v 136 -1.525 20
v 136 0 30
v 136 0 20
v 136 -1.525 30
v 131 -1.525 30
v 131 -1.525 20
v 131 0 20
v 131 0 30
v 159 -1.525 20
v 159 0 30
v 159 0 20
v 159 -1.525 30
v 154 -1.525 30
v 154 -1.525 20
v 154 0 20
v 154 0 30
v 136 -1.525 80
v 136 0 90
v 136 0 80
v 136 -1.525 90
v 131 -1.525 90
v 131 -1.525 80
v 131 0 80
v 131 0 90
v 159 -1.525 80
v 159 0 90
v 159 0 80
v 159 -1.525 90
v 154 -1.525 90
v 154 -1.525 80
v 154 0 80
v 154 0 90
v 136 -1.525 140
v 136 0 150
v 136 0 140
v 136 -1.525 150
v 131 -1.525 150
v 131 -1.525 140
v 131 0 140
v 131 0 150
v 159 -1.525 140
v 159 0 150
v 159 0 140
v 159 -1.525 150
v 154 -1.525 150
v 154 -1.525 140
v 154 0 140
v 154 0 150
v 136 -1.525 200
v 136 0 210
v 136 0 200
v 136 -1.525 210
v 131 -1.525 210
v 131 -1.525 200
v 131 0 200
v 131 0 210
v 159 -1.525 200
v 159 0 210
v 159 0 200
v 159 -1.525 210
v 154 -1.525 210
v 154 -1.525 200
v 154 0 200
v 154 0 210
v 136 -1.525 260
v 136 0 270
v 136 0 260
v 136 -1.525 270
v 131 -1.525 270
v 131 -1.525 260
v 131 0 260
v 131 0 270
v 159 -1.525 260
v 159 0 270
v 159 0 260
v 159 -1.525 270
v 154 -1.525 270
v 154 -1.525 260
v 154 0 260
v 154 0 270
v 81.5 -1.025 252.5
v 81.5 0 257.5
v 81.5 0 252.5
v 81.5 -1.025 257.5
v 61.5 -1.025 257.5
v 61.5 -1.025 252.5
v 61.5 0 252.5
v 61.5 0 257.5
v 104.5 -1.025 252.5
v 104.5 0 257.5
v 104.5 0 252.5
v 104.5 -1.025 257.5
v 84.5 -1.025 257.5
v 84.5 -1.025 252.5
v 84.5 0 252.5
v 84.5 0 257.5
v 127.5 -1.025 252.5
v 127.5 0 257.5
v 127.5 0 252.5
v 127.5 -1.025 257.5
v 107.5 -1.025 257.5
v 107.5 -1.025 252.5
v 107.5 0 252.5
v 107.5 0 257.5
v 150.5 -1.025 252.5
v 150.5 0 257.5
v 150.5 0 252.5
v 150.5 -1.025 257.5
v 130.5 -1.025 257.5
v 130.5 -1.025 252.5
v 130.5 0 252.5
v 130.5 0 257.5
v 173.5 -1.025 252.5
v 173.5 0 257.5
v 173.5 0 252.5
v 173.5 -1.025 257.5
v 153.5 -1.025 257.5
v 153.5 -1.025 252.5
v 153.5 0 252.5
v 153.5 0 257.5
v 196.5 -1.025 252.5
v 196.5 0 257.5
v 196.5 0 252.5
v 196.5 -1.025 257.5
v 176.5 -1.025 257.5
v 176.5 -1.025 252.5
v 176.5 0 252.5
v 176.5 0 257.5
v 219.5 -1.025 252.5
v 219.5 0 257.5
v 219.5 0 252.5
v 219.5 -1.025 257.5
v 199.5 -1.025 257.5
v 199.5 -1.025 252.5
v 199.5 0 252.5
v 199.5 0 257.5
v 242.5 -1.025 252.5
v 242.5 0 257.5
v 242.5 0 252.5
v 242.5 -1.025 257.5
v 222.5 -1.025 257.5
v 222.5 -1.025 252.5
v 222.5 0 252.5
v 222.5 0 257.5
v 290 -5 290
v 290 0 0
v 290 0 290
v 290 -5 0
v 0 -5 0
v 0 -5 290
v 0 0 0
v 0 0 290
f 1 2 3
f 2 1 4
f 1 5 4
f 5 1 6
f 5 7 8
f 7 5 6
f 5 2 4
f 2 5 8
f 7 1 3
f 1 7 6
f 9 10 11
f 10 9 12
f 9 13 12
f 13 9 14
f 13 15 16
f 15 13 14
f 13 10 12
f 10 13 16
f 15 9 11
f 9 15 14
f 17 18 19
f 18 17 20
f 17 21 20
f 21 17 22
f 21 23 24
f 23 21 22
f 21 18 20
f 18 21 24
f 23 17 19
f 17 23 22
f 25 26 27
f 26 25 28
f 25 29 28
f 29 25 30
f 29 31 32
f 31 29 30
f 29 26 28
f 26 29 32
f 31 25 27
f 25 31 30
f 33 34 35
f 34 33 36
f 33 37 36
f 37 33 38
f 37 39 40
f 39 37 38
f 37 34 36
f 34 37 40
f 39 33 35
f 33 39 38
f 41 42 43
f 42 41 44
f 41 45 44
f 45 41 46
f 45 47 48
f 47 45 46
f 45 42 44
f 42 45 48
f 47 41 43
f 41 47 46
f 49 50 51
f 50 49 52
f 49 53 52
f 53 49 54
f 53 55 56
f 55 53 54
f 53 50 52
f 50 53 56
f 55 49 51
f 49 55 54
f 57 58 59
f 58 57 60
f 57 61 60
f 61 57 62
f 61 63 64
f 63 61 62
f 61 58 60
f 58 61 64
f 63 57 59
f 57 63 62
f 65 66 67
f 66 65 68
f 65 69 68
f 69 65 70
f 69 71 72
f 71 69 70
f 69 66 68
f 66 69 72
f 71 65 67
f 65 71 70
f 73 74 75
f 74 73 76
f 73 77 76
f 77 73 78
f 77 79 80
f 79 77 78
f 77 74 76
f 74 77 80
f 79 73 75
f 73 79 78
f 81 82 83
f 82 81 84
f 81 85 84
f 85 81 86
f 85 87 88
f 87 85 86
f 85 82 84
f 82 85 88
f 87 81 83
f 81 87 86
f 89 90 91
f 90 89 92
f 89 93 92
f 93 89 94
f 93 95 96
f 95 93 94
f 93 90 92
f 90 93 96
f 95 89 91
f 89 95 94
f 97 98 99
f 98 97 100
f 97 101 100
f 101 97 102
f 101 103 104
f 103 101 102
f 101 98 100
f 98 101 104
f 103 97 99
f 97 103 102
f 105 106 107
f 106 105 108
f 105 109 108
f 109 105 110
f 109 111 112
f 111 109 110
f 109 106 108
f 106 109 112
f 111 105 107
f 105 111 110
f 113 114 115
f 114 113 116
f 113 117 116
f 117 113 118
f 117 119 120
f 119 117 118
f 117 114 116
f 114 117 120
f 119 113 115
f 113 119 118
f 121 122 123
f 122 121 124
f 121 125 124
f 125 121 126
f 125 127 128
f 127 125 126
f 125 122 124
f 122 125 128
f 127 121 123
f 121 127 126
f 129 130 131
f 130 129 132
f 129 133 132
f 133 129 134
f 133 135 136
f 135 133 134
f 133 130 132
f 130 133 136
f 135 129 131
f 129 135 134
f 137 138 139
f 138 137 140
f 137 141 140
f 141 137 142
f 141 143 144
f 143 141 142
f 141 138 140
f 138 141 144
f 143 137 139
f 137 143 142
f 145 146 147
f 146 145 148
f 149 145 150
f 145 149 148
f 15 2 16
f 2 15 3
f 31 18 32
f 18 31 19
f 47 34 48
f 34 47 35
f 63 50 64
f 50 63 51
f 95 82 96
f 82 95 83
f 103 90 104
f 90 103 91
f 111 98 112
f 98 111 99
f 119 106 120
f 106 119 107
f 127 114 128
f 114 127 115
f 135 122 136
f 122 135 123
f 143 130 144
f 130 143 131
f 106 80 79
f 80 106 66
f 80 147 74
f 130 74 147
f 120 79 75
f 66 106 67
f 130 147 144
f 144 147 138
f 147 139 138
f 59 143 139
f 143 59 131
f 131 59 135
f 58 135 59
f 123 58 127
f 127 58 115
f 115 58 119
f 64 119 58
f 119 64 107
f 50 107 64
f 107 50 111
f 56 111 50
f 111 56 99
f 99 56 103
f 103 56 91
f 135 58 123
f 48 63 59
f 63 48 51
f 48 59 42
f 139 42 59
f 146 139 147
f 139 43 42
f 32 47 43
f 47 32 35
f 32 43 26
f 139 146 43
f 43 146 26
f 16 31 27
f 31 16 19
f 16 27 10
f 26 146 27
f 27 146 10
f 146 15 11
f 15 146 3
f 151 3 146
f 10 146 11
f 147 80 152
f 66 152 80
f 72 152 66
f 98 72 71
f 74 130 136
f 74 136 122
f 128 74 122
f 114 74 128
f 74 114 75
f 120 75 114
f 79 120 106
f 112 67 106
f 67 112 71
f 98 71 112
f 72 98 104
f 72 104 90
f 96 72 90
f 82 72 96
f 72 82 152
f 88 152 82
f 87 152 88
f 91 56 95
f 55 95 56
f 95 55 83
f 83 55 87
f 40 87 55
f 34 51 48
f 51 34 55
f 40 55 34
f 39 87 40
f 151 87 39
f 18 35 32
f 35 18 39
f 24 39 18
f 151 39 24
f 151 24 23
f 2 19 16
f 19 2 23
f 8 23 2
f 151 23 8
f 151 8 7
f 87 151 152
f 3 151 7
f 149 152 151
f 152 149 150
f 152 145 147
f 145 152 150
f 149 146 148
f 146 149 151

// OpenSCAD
$fa=6;
$fs=0.05;
p = 0.05;
p2 = 2*p;

inplace = true;

lx = 290;
ly = 290;
lz = 290;
th = 5;

ramp_y = 145;

//top
cable_hole_d = 30;

anchor_x = 14;
anchor_y = 14;
anchor_d = 3;

cam_distance = 18;
cam_y = ly - (ly-ramp_y)/2;
cam_x1 = lx/2 - cam_distance/2;
cam_x2 = lx/2 + cam_distance/2;
cam_d = 2.1;

cam_cable_w = 18;
cam_cable_holder_w = 5;
cam_cable_holder_l = 10;
cam_cable_holder_h1 = 6;
cam_cable_holder_t = 3;
cam_cable_holder_depth = 1.5;
cam_cable_x1 = lx/2 - (cam_cable_w/2 + cam_cable_holder_w/2);
cam_cable_x2 = lx/2 + (cam_cable_w/2 + cam_cable_holder_w/2);
cam_cable_y_top_dy = 50;
cam_cable_y_top_y_start = 10 + cam_cable_holder_l/2;
cam_cable_y_top = [cam_cable_y_top_y_start,
                   cam_cable_y_top_y_start + 1 * cam_cable_y_top_dy,
                   cam_cable_y_top_y_start + 2 * cam_cable_y_top_dy,
                   cam_cable_y_top_y_start + 3 * cam_cable_y_top_dy]; 

//bottom
motor_mount_x = [25, 70];
motor_mount_y = [5, 60, 115];
motor_mount_d = 2.8;

//front
cam_cable_y_front_dy = 60;
cam_cable_y_front_y_start = 20 + cam_cable_holder_l/2;
cam_cable_y_front = [cam_cable_y_front_y_start,
                     cam_cable_y_front_y_start + 1 * cam_cable_y_front_dy,
                     cam_cable_y_front_y_start + 2 * cam_cable_y_front_dy,
                     cam_cable_y_front_y_start + 3 * cam_cable_y_front_dy,
                     cam_cable_y_front_y_start + 4 * cam_cable_y_front_dy]; 

magnet_l = 20;
magnet_w = 5;
magnet_h = 1;

magnet_y = lz - 30 - magnet_w;
magnet_x_spacing = 3;
magnet_count = 8;
magnet_x_start = (lx - magnet_count * (magnet_x_spacing + magnet_l) - magnet_x_spacing) / 2;

module hole(d, h=th+p2) {
    translate([0, 0, h/2-p])
    cylinder(h=h, d=d, center=true);
}

module engrave(a, b, c) {
    translate([0, 0, c/2])
    cube([a, b, c+p], center=true);    
}

module cable_holder_hole() {
    engrave(cam_cable_holder_w, cam_cable_holder_l, cam_cable_holder_depth);
}

module cable_holder() {
    union() {
        cube([cam_cable_holder_w, cam_cable_holder_l, cam_cable_holder_h1]);
        translate([cam_cable_w + cam_cable_holder_w, 0, 0])
        cube([cam_cable_holder_w, cam_cable_holder_l, cam_cable_holder_h1]);
        cube([cam_cable_w + 2 * cam_cable_holder_w, cam_cable_holder_l, cam_cable_holder_t]);
    }
}

module motor_mount_holes() {    
    for (i=motor_mount_x) {
        for(j=motor_mount_y) {
            translate([i, j, 0])
            hole(motor_mount_d);
        }
    }
}

module top_() {
    difference() {
        cube([lx, ly, th]);
        //cable_hole
        translate([lx/2, ly/2, 0])
        hole(cable_hole_d);
        //anchors
        translate([anchor_x, anchor_y, 0])
        hole(anchor_d);
        translate([lx - anchor_x, anchor_y, 0])
        hole(anchor_d);
        translate([anchor_x, ly - anchor_y, 0])
        hole(anchor_d);
        translate([lx - anchor_x, ly - anchor_y, 0])
        hole(anchor_d);
        //cam        
        translate([cam_x1, cam_y, 0])
        hole(cam_d);
        translate([cam_x2, cam_y, 0])
        hole(cam_d);
        //cam_cable
        for (i=cam_cable_y_top) {
            translate([cam_cable_x1, i, 0])
            cable_holder_hole();
            translate([cam_cable_x2, i, 0])
            cable_holder_hole();
        }
    }    
}

module bottom_() {
    difference() {
        cube([lx, ly, th]);
        //cable_hole
        translate([lx/2, ly/2, 0])
        hole(cable_hole_d);
        //motor mount
        motor_mount_holes();
        mirror([1, 0, 0])
        translate([-lx, 0, 0])
        motor_mount_holes();
    }    
}

module left_() {
    difference() {
        cube([lx, ly, th]);
        //cable_hole
        translate([lx/2, ly/2, 0])
        hole(cable_hole_d);
    }    
}

module right_() {
    difference() {
        cube([lx, ly, th]);
        //cable_hole
        translate([lx/2, ly/2, 0])
        hole(cable_hole_d);
    }    
}

module front_() {
    difference() {
        cube([lx, ly, th]);
        //cam_cable
        for (i=cam_cable_y_front) {
            translate([cam_cable_x1, i, 0])
            cable_holder_hole();
            translate([cam_cable_x2, i, 0])
            cable_holder_hole();
        }
        //magnets
        for(i=[0:magnet_count-1]) {
            translate([magnet_x_start + magnet_l + i * (magnet_l + magnet_x_spacing), magnet_y, 0])
            engrave(magnet_l, magnet_w, magnet_h);
        }
    }    
}

module back_() {
    difference() {
        cube([lx, ly, th]);
        //cable_hole
        translate([lx/2, ly/2, 0])
        hole(cable_hole_d);
    }    
}

module top() {
    if (inplace) {
        translate([0, 0, lz])
        top_();
    }
    else {
        top_();
    }
}
module bottom() {
    if (inplace) {        
        bottom_();
    }
    else {
        bottom_();
    }
}
module left() {
    if (inplace) {
        rotate([0, -90, 0])
        left_();
    }
    else {
        left_();
    }
}
module right() {
    if (inplace) {
        translate([lx, 0, lz])
        rotate([0, 90, 0])
        right_();
    }
    else {
        right_();
    }
}
module front() {
    if (inplace) {
        rotate([90, 0, 0])
        front_();
    }
    else {
        front_();
    }
}
module back() {
    if (inplace) {
        translate([0, ly, lz])
        rotate([-90, 0, 0])
        back_();
    }
    else {
        back_();
    }
}


//faces
*top();
*bottom();
*left();
*right();
front();
*back();
*cable_holder();
